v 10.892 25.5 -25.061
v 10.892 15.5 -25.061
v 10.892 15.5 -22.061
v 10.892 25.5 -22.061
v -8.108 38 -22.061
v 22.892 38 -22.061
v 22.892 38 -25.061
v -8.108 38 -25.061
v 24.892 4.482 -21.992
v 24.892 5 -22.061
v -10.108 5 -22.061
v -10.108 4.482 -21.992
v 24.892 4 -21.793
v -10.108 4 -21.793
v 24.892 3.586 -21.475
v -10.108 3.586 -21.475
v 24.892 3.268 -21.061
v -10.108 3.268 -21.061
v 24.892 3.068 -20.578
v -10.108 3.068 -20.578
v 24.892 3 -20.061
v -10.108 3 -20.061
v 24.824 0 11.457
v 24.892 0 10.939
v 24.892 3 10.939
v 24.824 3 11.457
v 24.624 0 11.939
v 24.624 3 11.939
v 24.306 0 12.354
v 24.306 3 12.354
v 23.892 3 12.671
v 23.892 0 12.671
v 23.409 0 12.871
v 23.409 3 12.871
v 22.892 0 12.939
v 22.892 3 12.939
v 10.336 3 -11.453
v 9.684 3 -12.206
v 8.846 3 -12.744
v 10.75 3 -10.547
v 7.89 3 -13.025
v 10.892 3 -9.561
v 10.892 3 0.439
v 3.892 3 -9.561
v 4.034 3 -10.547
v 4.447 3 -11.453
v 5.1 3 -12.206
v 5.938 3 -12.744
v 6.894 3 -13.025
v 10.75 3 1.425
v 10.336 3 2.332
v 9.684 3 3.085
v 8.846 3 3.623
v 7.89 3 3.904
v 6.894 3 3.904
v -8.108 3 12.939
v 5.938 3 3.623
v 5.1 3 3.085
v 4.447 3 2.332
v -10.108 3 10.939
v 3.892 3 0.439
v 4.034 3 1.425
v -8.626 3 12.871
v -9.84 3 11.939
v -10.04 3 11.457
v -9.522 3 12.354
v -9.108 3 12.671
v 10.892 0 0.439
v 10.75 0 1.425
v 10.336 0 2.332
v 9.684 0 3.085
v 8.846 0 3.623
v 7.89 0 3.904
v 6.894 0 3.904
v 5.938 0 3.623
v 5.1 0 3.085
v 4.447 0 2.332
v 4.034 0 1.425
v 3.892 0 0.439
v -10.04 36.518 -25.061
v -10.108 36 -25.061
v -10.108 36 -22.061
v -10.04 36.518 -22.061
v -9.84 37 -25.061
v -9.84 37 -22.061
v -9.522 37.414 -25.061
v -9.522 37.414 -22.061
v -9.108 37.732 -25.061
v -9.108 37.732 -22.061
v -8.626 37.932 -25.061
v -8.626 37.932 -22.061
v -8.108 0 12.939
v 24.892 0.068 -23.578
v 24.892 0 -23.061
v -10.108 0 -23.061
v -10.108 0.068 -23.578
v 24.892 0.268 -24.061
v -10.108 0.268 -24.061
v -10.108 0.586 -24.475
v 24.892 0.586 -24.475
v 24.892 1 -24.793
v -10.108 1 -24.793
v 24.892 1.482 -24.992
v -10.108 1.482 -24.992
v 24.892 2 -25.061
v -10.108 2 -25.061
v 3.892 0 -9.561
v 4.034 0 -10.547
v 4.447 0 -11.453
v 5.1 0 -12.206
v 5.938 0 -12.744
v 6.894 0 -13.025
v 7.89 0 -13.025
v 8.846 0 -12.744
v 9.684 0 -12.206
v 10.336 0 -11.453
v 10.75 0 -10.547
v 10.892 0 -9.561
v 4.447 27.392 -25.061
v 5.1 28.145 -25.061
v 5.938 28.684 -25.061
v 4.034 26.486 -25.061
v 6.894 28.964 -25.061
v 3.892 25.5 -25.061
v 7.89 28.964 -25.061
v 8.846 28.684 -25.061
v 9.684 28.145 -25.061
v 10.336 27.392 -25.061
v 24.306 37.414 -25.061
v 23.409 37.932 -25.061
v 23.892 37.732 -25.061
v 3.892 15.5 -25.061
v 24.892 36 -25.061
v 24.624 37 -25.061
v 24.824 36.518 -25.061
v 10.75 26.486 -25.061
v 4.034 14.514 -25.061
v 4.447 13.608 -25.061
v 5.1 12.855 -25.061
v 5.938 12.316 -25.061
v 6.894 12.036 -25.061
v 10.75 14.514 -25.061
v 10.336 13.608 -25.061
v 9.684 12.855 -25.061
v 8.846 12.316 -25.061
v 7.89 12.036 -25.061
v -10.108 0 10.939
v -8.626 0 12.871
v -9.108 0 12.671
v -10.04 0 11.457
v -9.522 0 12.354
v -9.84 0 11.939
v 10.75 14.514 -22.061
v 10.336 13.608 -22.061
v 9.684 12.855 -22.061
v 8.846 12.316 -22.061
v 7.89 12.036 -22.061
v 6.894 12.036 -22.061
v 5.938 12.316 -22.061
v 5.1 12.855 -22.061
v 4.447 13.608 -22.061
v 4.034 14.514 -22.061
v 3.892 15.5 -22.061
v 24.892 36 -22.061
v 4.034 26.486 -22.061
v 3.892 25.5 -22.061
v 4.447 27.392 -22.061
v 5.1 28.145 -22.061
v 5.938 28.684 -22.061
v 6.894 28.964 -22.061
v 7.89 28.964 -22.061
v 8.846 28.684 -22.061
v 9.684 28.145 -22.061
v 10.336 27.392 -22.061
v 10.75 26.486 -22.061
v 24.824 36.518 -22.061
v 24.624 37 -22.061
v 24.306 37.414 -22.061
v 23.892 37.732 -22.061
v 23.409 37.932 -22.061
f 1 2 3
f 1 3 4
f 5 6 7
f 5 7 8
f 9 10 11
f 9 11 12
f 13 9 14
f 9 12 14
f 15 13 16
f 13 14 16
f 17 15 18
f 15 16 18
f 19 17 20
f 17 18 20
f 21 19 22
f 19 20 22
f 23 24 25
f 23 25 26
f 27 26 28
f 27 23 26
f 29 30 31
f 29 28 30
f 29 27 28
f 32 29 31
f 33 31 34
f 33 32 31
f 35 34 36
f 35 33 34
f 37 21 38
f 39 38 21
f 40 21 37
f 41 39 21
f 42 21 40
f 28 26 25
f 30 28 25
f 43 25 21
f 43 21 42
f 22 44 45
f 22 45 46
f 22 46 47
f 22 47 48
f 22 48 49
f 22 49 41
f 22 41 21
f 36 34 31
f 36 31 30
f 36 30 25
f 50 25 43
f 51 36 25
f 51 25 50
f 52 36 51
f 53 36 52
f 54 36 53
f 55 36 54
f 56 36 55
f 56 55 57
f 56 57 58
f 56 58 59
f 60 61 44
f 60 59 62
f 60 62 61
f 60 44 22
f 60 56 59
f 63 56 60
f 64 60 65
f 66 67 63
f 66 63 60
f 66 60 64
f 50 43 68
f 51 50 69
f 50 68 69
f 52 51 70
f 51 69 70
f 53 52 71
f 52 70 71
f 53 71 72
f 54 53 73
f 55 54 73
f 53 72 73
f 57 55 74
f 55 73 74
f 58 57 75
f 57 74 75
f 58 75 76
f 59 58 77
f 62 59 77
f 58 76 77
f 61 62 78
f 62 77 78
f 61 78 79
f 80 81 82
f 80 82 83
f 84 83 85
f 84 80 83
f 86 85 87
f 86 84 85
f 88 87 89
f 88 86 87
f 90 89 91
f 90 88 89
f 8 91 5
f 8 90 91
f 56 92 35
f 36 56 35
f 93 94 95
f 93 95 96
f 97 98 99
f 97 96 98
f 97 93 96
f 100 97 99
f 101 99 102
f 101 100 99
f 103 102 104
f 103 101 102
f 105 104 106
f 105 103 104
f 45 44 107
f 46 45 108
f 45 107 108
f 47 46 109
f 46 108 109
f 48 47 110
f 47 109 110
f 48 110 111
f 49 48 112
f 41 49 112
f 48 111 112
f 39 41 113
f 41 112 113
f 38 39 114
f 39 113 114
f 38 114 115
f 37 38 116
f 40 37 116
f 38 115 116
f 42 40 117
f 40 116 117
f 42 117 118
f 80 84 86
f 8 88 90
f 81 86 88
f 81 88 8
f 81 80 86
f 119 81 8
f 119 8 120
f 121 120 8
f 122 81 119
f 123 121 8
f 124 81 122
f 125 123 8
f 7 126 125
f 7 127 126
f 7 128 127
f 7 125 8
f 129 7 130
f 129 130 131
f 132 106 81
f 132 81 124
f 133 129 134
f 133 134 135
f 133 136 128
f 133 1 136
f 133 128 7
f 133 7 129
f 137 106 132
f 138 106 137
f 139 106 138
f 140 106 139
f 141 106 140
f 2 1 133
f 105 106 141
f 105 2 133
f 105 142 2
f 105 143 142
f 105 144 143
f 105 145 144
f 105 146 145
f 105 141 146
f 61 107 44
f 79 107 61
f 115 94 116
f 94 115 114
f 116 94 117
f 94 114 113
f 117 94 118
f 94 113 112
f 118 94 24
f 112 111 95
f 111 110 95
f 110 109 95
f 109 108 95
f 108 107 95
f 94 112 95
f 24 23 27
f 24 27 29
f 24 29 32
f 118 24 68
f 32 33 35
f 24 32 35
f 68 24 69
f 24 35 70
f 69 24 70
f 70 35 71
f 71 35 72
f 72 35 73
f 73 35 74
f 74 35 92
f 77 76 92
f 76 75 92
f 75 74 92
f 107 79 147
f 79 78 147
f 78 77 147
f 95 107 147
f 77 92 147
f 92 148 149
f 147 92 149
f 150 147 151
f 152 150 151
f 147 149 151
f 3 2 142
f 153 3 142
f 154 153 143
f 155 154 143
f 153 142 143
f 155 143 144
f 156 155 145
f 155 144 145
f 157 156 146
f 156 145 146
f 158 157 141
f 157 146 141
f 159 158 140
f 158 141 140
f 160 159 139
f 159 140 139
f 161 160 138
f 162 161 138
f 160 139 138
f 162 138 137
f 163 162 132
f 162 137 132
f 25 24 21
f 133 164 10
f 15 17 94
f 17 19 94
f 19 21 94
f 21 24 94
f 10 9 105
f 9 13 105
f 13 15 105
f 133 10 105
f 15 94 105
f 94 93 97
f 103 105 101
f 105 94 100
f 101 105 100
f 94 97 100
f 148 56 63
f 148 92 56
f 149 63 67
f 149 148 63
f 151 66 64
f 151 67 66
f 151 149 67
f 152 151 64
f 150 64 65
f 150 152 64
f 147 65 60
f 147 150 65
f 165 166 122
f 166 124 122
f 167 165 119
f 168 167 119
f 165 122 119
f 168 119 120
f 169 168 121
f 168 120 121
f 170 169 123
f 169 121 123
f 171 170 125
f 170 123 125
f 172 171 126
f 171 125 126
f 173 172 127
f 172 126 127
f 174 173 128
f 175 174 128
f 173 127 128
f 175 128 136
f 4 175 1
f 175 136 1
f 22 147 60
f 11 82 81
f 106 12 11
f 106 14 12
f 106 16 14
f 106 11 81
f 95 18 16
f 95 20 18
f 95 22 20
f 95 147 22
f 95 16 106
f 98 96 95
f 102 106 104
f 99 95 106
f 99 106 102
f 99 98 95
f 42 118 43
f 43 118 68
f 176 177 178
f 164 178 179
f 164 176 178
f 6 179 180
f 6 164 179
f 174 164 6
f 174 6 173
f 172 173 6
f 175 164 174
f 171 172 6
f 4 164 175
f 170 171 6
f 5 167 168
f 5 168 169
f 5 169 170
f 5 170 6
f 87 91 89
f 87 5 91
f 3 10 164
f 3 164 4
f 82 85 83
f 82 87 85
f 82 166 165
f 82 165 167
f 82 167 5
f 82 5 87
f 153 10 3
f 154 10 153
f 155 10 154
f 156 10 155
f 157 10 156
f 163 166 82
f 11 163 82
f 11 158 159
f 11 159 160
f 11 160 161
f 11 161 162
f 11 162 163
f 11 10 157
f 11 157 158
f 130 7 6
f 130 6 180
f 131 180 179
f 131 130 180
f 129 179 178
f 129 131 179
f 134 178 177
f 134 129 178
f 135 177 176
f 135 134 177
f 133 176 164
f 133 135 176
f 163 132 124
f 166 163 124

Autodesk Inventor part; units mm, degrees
ref_plane "YZ Plane" through (0, 0, 0) normal (1, 0, 0) x (0, 1, 0)
ref_plane "XZ Plane" through (0, 0, 0) normal (0, 1, 0) x (-1, 0, 0)
ref_plane "XY Plane" through (0, 0, 0) normal (0, 0, 1) x (1, 0, 0)
sketch "스케치1" plane through (0, 0, 0) normal (0, 1, 0) x (-1, 0, 0)
  line L0 (8.1082, 12.9394) -> (-22.8918, 12.9394)
  line L1 (-24.8918, 10.9394) -> (-24.8918, -22.0606)
  line L2 (-24.8918, -22.0606) -> (10.1082, -22.0606)
  line L3 (10.1082, -22.0606) -> (10.1082, 10.9394)
  arc A0 (10.1082, 10.9394) -> (8.1082, 12.9394) centre (8.1082, 10.9394) ccw
  arc A1 (-22.8918, 12.9394) -> (-24.8918, 10.9394) centre (-22.8918, 10.9394) ccw
  line L4 (10.1082, -25.0606) -> (-24.8918, -25.0606)
  line L5 (10.1082, -22.0606) -> (10.1082, -25.0606)
  line L6 (-24.8918, -22.0606) -> (-24.8918, -25.0606)
  line L7 (-10.8918, -9.5606) -> (-10.8918, 0.4394)
  line L8 (-3.8918, -9.5606) -> (-3.8918, 0.4394)
  line L9 (-3.8918, 0.4394) -> (-10.8918, 0.4394)
  line L10 (-10.8918, -9.5606) -> (-3.8918, -9.5606)
  arc A2 (-10.8918, -9.5606) -> (-3.8918, -9.5606) centre (-7.3918, -9.5606) ccw
  arc A3 (-3.8918, 0.4394) -> (-10.8918, 0.4394) centre (-7.3918, 0.4394) ccw
  line L11 (-24.8918, 19.0606) -> (-24.8918, -10.9394)
  point P0 (0, 0)
  point P1 (-24.8918, 12.9394)
  point P2 (0, 0)
  point P3 (-3.8918, -4.5606)
  point P4 (-10.8918, -4.5606)
  point P5 (-7.3918, -23.5606)
  point P6 (-7.3918, -22.0606)
  point P7 (-7.3918, -13.0606)
  point P8 (-7.3918, 12.9394)
  point P9 (-7.3918, 3.9394)
  dimension "d0" = 35
  dimension "d1" = 35
  dimension "d2" = 2
  dimension "d3" = 2
  dimension "d14" = 3
  dimension "d20" = 10
  dimension "d21" = 7
  dimension "d22" = 14
  dimension "d23" = 14
  dimension "d24" = 14
  dimension "d26" = 9
extrude "돌출3" add sketch "스케치1" along normal blind 3 contours A0 L3 L2 L1 A1 L0 | L7 L9 L8 L10 | L10 A2 | A3 L9
extrude "돌출4" add sketch "스케치1" along normal blind 38 contours L5 L4 L6 L2
fillet "모깎기2" radius 2 4 edges at (24.8918, 38, -23.5606) (-10.1082, 38, -23.5606) (7.3918, 3, -22.0606) (7.3918, 0, -25.0606)
sketch "스케치6" plane through (24.8918, 2, -25.0606) normal (0, 0, -1) x (-1, 0, 0)
  line L0 (33, 36) -> (2, 36)
  line L1 (0, 34) -> (0, 1)
  line L2 (0, 1) -> (35, 1)
  line L3 (35, 1) -> (35, 34)
  arc A0 (35, 34) -> (33, 36) centre (33, 34) ccw
  arc A1 (2, 36) -> (0, 34) centre (2, 34) ccw
  line L4 (35, -2) -> (0, -2)
  line L5 (35, 1) -> (35, -2)
  line L6 (0, 1) -> (0, -2)
  line L7 (14, 13.5) -> (14, 23.5)
  line L8 (21, 13.5) -> (21, 23.5)
  line L9 (21, 23.5) -> (14, 23.5)
  line L10 (14, 13.5) -> (21, 13.5)
  arc A2 (14, 13.5) -> (21, 13.5) centre (17.5, 13.5) ccw
  arc A3 (21, 23.5) -> (14, 23.5) centre (17.5, 23.5) ccw
  line L11 (0, 42.063) -> (0, 12.063)
  line L12 (0, 0) -> (0, 34) projected
  line L13 (0, -2) -> (35, -2) projected
  point P0 (24.8918, -2)
  point P1 (24.6406, 23.0024)
  point P2 (0, 36)
  point P3 (24.6406, 23.0024)
  point P4 (14, 18.5)
  point P5 (21, 18.5)
  point P6 (17.2488, -0.5)
  point P7 (17.5, 1)
  point P8 (17.5, 10)
  point P9 (17.5, 36)
  point P10 (17.5, 27)
  dimension "d38" = 35
  dimension "d39" = 35
  dimension "d40" = 2
  dimension "d41" = 2
  dimension "d42" = 3
  dimension "d43" = 10
  dimension "d44" = 7
  dimension "d45" = 14
  dimension "d46" = 14
  dimension "d47" = 14
  dimension "d48" = 9
  dimension "d49" = 0
  dimension "d50" = 0
extrude "돌출5" cut sketch "스케치6" against normal blind 38 contours L7 L9 L8 L10 | L10 A2 | A3 L9
extrude "돌출6" cut sketch "스케치1" along normal blind 38 contours L7 L9 L8 L10 | L10 A2 | A3 L9
properties part number "L자 브라켓" material "강철, 합금"
